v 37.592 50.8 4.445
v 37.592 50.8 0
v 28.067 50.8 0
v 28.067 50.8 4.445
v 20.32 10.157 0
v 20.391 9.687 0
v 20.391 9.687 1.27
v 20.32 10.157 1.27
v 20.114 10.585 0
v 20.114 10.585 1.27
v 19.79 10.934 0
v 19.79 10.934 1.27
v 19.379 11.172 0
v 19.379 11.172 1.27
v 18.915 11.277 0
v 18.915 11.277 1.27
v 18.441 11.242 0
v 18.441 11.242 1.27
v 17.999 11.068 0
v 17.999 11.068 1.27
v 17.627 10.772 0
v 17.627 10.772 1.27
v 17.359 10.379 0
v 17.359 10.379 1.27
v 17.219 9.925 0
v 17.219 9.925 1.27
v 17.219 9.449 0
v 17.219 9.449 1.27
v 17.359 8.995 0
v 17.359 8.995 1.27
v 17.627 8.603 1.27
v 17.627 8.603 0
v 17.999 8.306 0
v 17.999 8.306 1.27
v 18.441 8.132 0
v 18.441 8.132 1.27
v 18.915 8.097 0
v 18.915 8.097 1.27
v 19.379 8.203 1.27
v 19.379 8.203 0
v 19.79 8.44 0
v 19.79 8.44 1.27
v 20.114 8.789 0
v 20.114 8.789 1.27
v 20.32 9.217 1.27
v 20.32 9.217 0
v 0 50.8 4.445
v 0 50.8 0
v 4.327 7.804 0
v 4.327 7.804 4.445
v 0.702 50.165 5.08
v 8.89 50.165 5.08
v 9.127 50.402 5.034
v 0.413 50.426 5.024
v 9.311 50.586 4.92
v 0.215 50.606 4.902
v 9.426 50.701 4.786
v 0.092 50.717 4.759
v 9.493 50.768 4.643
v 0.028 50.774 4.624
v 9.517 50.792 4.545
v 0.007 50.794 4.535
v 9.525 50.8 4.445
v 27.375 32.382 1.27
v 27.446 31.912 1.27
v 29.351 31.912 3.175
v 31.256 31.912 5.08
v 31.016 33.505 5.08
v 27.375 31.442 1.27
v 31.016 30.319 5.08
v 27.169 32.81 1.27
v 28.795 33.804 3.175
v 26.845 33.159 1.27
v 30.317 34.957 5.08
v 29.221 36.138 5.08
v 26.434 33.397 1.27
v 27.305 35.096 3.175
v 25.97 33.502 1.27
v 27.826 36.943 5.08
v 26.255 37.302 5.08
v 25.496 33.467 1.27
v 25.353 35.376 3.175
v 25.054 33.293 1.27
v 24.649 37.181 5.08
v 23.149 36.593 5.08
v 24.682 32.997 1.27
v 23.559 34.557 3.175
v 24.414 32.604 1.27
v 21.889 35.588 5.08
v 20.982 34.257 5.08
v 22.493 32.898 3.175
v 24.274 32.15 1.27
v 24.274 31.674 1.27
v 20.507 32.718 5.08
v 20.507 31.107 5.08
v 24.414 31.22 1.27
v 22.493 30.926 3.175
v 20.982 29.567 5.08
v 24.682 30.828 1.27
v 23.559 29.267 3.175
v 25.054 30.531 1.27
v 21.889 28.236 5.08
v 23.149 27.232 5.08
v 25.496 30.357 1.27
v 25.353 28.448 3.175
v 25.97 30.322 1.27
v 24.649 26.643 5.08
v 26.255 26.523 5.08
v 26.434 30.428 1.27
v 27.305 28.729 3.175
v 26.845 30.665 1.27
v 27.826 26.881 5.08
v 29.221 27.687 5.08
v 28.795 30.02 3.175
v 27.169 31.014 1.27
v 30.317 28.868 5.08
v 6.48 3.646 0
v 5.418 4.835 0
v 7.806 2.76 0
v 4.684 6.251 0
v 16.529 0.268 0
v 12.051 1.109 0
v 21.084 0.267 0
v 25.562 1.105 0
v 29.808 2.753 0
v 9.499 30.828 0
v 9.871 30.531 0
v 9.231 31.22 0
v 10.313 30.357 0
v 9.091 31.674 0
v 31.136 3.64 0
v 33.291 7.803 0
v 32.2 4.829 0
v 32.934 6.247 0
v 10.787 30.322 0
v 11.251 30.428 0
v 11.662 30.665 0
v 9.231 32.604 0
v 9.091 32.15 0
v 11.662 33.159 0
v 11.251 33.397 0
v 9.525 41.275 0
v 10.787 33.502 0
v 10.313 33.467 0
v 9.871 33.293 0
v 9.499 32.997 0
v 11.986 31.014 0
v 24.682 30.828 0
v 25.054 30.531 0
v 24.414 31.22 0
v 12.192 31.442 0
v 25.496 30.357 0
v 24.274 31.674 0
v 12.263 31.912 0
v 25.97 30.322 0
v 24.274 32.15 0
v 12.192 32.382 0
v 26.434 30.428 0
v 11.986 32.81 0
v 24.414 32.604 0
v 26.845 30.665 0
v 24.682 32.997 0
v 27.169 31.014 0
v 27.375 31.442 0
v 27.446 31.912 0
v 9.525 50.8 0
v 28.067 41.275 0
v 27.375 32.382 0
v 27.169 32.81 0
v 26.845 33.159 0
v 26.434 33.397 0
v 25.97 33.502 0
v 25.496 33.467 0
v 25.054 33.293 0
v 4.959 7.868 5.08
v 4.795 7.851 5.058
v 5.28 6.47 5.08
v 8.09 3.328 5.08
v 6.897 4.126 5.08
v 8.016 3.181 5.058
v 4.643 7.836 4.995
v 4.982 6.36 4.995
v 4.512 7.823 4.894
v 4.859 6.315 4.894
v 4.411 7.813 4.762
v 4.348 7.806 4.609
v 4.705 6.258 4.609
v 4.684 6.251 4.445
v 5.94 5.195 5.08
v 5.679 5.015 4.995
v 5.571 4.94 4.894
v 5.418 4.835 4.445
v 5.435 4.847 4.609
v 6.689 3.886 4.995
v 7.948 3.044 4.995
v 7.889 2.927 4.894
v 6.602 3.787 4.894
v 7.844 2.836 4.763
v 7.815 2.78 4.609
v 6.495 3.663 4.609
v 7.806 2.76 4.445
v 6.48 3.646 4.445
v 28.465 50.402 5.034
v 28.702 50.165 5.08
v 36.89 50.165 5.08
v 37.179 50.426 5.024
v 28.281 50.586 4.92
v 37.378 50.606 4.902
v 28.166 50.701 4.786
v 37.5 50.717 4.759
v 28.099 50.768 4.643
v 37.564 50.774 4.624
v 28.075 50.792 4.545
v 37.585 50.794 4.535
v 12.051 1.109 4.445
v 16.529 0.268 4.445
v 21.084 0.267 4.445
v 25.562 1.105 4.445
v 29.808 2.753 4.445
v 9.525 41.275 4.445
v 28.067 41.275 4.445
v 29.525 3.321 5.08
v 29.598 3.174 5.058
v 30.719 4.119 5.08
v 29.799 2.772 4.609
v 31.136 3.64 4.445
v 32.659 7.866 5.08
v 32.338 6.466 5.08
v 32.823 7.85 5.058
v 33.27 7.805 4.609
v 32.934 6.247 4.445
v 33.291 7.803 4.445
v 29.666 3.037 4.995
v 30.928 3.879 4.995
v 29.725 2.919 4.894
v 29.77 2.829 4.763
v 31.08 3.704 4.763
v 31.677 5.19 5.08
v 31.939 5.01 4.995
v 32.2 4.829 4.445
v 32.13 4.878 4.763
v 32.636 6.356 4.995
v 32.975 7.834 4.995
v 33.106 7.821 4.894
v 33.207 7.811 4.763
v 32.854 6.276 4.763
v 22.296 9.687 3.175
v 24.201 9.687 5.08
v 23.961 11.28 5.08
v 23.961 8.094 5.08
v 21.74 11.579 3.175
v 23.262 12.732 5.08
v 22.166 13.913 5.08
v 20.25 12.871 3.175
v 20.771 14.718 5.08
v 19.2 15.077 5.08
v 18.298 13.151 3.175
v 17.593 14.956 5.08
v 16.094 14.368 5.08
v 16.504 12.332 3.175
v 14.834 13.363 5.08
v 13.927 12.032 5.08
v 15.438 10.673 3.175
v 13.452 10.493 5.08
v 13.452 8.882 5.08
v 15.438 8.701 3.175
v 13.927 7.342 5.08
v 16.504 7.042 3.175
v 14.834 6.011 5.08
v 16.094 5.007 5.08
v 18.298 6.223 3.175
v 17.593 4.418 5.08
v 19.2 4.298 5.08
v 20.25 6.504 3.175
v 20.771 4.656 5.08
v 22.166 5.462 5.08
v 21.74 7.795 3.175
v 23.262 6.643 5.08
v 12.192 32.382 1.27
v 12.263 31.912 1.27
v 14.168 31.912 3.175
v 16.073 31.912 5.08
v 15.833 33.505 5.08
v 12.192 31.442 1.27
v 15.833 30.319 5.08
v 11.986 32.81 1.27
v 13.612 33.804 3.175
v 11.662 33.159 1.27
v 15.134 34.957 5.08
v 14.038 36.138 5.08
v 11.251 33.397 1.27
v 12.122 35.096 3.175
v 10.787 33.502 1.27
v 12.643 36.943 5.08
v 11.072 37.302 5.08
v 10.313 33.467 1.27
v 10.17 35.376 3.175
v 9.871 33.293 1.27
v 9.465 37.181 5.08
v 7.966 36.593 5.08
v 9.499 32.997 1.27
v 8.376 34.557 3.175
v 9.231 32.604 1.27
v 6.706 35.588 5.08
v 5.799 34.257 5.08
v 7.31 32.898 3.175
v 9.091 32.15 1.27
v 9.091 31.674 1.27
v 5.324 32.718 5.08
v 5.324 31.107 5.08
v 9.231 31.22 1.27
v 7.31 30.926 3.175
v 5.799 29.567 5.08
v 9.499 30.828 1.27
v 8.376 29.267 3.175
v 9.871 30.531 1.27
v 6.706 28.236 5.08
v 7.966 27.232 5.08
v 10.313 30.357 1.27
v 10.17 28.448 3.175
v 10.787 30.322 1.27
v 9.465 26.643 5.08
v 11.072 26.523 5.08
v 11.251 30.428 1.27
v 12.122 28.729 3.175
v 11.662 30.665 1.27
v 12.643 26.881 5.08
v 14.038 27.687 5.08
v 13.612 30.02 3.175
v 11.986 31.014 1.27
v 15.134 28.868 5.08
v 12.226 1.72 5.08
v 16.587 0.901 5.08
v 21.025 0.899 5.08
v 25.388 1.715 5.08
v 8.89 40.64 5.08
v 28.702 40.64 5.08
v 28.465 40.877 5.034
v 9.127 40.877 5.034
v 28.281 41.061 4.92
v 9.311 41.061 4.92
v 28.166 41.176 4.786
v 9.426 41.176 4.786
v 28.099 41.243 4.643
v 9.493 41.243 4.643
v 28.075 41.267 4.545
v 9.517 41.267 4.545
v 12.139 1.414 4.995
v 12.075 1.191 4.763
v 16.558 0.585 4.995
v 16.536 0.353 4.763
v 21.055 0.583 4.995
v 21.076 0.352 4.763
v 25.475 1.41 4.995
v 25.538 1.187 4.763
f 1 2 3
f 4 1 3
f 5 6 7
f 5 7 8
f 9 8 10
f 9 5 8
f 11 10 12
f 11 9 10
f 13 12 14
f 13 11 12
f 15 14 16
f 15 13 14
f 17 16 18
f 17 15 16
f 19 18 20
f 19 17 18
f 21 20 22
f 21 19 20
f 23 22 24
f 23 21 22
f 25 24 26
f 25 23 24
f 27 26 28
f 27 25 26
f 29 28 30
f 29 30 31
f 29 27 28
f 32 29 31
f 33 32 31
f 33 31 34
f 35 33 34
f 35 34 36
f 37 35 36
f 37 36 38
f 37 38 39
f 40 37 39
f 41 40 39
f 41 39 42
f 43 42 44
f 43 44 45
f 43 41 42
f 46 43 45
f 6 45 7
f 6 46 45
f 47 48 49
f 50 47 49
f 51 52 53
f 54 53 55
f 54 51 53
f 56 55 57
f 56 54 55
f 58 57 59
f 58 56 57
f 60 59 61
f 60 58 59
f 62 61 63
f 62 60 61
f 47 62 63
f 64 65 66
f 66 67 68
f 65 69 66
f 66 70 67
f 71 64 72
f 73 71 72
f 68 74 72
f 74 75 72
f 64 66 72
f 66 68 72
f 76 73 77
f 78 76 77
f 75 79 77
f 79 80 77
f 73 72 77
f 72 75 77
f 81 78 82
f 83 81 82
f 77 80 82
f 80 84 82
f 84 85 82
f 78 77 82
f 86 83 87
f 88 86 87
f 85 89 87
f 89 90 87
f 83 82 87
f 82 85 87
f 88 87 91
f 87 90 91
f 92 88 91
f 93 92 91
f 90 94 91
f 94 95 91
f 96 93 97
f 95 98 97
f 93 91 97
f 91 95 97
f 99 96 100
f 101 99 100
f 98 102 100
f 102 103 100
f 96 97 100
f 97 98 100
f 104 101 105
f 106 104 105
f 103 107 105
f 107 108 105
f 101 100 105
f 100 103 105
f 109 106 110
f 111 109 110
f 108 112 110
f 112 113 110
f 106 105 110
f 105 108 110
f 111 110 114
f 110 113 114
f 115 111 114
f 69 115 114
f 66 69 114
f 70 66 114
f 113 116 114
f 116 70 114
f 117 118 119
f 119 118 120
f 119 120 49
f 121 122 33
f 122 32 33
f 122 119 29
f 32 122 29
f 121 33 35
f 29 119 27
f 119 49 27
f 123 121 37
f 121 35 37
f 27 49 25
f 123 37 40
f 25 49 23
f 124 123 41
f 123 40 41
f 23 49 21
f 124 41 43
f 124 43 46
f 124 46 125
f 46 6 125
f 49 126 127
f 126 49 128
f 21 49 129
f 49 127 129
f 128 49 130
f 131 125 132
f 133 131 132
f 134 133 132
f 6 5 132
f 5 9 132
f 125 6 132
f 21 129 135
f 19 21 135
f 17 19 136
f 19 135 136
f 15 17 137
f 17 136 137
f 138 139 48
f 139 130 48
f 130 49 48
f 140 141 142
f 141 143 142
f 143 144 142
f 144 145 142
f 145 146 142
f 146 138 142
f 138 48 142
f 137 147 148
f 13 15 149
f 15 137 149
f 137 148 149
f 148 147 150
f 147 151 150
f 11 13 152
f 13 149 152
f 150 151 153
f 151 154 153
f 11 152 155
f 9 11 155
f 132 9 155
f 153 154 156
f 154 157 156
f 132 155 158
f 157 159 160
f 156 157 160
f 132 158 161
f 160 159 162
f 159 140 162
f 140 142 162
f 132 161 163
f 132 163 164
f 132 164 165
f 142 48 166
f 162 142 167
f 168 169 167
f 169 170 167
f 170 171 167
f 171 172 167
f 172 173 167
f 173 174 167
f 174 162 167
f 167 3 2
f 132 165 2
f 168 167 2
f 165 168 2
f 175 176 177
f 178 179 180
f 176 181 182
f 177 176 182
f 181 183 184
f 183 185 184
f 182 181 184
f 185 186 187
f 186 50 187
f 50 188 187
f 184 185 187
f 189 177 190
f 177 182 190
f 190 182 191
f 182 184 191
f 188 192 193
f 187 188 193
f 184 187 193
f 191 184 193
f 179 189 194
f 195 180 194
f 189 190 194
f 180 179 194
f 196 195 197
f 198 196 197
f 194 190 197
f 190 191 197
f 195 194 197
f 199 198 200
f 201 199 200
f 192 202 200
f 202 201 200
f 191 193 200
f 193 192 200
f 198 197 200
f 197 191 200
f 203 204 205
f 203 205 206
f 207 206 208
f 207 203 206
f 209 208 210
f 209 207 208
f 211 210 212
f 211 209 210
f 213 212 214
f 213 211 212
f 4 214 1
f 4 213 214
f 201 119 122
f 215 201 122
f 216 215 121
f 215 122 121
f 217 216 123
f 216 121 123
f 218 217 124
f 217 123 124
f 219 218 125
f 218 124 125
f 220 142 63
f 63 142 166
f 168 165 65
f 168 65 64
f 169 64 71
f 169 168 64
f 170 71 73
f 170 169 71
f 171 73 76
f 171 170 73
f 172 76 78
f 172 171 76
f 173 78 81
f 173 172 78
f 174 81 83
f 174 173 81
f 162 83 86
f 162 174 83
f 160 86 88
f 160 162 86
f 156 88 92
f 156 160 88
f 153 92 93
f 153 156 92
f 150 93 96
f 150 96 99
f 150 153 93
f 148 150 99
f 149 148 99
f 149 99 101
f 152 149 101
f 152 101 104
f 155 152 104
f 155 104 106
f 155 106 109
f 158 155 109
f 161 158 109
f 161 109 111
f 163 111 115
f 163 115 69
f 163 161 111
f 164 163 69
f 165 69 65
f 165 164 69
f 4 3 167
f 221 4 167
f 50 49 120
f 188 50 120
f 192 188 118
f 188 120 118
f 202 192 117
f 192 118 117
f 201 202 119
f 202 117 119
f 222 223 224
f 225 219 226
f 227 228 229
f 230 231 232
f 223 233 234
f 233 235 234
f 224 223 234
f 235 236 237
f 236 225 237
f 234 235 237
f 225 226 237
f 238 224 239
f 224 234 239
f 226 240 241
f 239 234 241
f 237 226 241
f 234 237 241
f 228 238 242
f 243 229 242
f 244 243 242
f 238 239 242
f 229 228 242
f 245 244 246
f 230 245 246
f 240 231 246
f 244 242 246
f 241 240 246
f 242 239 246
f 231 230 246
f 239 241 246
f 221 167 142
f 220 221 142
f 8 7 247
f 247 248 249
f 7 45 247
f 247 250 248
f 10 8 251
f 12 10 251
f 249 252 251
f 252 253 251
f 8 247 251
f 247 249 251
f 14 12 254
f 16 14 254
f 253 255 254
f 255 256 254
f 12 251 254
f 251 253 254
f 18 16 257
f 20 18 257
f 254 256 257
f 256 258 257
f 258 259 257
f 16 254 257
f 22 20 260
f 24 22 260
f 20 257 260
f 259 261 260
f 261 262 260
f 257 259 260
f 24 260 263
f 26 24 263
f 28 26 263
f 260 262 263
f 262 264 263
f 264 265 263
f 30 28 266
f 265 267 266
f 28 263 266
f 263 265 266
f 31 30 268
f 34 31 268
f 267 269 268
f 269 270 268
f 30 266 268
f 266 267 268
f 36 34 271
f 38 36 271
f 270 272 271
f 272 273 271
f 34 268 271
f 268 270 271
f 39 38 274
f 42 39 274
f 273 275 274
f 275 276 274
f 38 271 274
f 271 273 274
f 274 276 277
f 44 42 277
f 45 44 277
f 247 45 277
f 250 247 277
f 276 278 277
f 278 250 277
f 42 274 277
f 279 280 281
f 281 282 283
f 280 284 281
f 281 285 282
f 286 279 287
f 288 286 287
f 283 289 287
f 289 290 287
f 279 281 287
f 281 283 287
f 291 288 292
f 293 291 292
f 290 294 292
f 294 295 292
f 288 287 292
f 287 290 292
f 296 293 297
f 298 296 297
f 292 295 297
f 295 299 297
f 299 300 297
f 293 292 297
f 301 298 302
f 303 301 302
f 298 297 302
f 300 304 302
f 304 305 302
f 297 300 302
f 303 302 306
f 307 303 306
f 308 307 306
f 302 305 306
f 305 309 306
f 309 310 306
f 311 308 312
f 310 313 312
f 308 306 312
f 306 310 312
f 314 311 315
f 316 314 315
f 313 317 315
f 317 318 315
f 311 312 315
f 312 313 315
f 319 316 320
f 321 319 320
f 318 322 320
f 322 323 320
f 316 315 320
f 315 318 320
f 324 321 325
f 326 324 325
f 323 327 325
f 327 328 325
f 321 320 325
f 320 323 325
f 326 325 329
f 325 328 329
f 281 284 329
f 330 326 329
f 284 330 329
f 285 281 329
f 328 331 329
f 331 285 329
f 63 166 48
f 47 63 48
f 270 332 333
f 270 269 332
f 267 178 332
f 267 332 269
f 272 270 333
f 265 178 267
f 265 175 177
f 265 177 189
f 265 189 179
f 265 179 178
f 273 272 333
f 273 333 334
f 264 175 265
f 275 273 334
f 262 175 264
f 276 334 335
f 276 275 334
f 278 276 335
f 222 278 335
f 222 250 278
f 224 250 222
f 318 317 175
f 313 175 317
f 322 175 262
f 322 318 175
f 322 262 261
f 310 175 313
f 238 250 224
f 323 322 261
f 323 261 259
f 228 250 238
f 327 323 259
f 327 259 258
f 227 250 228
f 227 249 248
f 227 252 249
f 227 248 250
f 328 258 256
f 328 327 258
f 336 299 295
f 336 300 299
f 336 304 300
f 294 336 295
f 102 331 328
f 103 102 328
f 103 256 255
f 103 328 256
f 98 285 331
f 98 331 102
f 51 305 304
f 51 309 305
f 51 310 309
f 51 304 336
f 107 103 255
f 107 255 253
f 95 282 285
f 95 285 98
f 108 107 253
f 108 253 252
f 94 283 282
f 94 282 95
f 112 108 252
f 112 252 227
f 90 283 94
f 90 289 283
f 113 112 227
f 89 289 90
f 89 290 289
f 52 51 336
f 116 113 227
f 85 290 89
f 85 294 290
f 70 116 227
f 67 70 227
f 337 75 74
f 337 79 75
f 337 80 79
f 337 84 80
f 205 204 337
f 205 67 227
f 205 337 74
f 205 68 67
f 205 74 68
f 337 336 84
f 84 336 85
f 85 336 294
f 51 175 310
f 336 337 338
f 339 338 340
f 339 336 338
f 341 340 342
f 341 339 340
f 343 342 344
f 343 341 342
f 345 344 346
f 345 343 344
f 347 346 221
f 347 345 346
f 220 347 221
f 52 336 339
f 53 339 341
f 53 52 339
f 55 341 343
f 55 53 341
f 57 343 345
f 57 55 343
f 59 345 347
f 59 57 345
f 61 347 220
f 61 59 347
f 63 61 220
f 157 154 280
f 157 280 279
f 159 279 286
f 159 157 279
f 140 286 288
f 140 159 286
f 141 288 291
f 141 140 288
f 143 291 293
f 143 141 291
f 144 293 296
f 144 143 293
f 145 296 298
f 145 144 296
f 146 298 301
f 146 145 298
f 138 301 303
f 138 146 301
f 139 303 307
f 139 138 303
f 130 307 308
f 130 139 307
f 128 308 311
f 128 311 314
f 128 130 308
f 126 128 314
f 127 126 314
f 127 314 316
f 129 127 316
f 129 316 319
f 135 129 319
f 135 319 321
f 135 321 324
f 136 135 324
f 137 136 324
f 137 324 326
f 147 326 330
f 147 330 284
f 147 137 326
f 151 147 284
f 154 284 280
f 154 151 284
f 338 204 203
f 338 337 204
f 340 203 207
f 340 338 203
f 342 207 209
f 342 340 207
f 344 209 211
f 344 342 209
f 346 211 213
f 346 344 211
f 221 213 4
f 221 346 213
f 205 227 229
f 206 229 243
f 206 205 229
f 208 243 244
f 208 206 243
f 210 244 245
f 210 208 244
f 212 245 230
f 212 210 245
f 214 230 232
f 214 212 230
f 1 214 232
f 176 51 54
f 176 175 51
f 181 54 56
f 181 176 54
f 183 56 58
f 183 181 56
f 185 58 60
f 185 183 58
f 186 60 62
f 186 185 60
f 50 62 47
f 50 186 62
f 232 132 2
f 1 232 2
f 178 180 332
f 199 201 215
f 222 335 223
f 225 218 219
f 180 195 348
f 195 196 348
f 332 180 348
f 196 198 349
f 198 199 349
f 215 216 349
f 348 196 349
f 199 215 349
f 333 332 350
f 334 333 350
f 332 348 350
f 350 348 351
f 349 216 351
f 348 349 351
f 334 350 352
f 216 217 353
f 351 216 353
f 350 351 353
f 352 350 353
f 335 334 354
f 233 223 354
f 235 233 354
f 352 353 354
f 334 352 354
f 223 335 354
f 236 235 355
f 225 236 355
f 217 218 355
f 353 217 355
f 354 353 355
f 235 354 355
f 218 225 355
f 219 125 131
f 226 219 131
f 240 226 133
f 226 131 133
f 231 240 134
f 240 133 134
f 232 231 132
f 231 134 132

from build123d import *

# Parameters (mm, degrees)
F0_R     = 1.594655
F1_DEPTH = 5.08
F2_SIZE  = 3.81
F3_R     = 0.635


with BuildPart() as f1:
    # F0 (on Top) → F1 (new body)
    with BuildSketch(Plane.XY):
        with BuildLine():
            Line((4e-06, 50.8), (4.326784, 7.804318))
            ThreePointArc((4.326784, 7.804318), (5.417594, 4.834844), (7.805764, 2.760165))
            ThreePointArc((7.805764, 2.760165), (18.806149, 0.162151), (29.808221, 2.753011))
            ThreePointArc((29.808221, 2.753011), (32.2, 4.829412), (33.291277, 7.802822))
            Line((33.291277, 7.802822), (37.592004, 50.8))
            Line((37.592004, 50.8), (28.067004, 50.8))
            Line((28.067004, 50.8), (28.067004, 41.275))
            Line((28.067004, 41.275), (9.525004, 41.275))
            Line((9.525004, 41.275), (9.525004, 50.8))
            Line((9.525004, 50.8), (4e-06, 50.8))
        make_face()
        with Locations((18.796004, 9.68716)):
            Circle(F0_R, mode=Mode.SUBTRACT)
        with Locations((10.668004, 31.91216)):
            Circle(F0_R, mode=Mode.SUBTRACT)
        with Locations((25.851231, 31.91216)):
            Circle(F0_R, mode=Mode.SUBTRACT)
    extrude(amount=F1_DEPTH)

    # F2
    f2_edges = [f1.edges().sort_by_distance(p)[0] for p in [
        (9.073348, 31.91216, 5.08),
        (24.256576, 31.91216, 5.08),
        (17.201348, 9.68716, 5.08),
    ]]
    chamfer(f2_edges, length=F2_SIZE)

    # F3
    f3_edges = [f1.edges().sort_by_distance(p)[0] for p in [
        (18.806149, 0.162151, 5.08),
        (32.2, 4.829412, 5.08),
        (32.829504, 50.8, 5.08),
        (9.525004, 46.0375, 5.08),
        (35.441641, 29.301411, 5.08),
        (2.163394, 29.302159, 5.08),
        (4.762504, 50.8, 5.08),
        (28.067004, 46.0375, 5.08),
        (5.417594, 4.834844, 5.08),
        (18.796004, 41.275, 5.08),
    ]]
    fillet(f3_edges, radius=F3_R)


solid = f1.part
